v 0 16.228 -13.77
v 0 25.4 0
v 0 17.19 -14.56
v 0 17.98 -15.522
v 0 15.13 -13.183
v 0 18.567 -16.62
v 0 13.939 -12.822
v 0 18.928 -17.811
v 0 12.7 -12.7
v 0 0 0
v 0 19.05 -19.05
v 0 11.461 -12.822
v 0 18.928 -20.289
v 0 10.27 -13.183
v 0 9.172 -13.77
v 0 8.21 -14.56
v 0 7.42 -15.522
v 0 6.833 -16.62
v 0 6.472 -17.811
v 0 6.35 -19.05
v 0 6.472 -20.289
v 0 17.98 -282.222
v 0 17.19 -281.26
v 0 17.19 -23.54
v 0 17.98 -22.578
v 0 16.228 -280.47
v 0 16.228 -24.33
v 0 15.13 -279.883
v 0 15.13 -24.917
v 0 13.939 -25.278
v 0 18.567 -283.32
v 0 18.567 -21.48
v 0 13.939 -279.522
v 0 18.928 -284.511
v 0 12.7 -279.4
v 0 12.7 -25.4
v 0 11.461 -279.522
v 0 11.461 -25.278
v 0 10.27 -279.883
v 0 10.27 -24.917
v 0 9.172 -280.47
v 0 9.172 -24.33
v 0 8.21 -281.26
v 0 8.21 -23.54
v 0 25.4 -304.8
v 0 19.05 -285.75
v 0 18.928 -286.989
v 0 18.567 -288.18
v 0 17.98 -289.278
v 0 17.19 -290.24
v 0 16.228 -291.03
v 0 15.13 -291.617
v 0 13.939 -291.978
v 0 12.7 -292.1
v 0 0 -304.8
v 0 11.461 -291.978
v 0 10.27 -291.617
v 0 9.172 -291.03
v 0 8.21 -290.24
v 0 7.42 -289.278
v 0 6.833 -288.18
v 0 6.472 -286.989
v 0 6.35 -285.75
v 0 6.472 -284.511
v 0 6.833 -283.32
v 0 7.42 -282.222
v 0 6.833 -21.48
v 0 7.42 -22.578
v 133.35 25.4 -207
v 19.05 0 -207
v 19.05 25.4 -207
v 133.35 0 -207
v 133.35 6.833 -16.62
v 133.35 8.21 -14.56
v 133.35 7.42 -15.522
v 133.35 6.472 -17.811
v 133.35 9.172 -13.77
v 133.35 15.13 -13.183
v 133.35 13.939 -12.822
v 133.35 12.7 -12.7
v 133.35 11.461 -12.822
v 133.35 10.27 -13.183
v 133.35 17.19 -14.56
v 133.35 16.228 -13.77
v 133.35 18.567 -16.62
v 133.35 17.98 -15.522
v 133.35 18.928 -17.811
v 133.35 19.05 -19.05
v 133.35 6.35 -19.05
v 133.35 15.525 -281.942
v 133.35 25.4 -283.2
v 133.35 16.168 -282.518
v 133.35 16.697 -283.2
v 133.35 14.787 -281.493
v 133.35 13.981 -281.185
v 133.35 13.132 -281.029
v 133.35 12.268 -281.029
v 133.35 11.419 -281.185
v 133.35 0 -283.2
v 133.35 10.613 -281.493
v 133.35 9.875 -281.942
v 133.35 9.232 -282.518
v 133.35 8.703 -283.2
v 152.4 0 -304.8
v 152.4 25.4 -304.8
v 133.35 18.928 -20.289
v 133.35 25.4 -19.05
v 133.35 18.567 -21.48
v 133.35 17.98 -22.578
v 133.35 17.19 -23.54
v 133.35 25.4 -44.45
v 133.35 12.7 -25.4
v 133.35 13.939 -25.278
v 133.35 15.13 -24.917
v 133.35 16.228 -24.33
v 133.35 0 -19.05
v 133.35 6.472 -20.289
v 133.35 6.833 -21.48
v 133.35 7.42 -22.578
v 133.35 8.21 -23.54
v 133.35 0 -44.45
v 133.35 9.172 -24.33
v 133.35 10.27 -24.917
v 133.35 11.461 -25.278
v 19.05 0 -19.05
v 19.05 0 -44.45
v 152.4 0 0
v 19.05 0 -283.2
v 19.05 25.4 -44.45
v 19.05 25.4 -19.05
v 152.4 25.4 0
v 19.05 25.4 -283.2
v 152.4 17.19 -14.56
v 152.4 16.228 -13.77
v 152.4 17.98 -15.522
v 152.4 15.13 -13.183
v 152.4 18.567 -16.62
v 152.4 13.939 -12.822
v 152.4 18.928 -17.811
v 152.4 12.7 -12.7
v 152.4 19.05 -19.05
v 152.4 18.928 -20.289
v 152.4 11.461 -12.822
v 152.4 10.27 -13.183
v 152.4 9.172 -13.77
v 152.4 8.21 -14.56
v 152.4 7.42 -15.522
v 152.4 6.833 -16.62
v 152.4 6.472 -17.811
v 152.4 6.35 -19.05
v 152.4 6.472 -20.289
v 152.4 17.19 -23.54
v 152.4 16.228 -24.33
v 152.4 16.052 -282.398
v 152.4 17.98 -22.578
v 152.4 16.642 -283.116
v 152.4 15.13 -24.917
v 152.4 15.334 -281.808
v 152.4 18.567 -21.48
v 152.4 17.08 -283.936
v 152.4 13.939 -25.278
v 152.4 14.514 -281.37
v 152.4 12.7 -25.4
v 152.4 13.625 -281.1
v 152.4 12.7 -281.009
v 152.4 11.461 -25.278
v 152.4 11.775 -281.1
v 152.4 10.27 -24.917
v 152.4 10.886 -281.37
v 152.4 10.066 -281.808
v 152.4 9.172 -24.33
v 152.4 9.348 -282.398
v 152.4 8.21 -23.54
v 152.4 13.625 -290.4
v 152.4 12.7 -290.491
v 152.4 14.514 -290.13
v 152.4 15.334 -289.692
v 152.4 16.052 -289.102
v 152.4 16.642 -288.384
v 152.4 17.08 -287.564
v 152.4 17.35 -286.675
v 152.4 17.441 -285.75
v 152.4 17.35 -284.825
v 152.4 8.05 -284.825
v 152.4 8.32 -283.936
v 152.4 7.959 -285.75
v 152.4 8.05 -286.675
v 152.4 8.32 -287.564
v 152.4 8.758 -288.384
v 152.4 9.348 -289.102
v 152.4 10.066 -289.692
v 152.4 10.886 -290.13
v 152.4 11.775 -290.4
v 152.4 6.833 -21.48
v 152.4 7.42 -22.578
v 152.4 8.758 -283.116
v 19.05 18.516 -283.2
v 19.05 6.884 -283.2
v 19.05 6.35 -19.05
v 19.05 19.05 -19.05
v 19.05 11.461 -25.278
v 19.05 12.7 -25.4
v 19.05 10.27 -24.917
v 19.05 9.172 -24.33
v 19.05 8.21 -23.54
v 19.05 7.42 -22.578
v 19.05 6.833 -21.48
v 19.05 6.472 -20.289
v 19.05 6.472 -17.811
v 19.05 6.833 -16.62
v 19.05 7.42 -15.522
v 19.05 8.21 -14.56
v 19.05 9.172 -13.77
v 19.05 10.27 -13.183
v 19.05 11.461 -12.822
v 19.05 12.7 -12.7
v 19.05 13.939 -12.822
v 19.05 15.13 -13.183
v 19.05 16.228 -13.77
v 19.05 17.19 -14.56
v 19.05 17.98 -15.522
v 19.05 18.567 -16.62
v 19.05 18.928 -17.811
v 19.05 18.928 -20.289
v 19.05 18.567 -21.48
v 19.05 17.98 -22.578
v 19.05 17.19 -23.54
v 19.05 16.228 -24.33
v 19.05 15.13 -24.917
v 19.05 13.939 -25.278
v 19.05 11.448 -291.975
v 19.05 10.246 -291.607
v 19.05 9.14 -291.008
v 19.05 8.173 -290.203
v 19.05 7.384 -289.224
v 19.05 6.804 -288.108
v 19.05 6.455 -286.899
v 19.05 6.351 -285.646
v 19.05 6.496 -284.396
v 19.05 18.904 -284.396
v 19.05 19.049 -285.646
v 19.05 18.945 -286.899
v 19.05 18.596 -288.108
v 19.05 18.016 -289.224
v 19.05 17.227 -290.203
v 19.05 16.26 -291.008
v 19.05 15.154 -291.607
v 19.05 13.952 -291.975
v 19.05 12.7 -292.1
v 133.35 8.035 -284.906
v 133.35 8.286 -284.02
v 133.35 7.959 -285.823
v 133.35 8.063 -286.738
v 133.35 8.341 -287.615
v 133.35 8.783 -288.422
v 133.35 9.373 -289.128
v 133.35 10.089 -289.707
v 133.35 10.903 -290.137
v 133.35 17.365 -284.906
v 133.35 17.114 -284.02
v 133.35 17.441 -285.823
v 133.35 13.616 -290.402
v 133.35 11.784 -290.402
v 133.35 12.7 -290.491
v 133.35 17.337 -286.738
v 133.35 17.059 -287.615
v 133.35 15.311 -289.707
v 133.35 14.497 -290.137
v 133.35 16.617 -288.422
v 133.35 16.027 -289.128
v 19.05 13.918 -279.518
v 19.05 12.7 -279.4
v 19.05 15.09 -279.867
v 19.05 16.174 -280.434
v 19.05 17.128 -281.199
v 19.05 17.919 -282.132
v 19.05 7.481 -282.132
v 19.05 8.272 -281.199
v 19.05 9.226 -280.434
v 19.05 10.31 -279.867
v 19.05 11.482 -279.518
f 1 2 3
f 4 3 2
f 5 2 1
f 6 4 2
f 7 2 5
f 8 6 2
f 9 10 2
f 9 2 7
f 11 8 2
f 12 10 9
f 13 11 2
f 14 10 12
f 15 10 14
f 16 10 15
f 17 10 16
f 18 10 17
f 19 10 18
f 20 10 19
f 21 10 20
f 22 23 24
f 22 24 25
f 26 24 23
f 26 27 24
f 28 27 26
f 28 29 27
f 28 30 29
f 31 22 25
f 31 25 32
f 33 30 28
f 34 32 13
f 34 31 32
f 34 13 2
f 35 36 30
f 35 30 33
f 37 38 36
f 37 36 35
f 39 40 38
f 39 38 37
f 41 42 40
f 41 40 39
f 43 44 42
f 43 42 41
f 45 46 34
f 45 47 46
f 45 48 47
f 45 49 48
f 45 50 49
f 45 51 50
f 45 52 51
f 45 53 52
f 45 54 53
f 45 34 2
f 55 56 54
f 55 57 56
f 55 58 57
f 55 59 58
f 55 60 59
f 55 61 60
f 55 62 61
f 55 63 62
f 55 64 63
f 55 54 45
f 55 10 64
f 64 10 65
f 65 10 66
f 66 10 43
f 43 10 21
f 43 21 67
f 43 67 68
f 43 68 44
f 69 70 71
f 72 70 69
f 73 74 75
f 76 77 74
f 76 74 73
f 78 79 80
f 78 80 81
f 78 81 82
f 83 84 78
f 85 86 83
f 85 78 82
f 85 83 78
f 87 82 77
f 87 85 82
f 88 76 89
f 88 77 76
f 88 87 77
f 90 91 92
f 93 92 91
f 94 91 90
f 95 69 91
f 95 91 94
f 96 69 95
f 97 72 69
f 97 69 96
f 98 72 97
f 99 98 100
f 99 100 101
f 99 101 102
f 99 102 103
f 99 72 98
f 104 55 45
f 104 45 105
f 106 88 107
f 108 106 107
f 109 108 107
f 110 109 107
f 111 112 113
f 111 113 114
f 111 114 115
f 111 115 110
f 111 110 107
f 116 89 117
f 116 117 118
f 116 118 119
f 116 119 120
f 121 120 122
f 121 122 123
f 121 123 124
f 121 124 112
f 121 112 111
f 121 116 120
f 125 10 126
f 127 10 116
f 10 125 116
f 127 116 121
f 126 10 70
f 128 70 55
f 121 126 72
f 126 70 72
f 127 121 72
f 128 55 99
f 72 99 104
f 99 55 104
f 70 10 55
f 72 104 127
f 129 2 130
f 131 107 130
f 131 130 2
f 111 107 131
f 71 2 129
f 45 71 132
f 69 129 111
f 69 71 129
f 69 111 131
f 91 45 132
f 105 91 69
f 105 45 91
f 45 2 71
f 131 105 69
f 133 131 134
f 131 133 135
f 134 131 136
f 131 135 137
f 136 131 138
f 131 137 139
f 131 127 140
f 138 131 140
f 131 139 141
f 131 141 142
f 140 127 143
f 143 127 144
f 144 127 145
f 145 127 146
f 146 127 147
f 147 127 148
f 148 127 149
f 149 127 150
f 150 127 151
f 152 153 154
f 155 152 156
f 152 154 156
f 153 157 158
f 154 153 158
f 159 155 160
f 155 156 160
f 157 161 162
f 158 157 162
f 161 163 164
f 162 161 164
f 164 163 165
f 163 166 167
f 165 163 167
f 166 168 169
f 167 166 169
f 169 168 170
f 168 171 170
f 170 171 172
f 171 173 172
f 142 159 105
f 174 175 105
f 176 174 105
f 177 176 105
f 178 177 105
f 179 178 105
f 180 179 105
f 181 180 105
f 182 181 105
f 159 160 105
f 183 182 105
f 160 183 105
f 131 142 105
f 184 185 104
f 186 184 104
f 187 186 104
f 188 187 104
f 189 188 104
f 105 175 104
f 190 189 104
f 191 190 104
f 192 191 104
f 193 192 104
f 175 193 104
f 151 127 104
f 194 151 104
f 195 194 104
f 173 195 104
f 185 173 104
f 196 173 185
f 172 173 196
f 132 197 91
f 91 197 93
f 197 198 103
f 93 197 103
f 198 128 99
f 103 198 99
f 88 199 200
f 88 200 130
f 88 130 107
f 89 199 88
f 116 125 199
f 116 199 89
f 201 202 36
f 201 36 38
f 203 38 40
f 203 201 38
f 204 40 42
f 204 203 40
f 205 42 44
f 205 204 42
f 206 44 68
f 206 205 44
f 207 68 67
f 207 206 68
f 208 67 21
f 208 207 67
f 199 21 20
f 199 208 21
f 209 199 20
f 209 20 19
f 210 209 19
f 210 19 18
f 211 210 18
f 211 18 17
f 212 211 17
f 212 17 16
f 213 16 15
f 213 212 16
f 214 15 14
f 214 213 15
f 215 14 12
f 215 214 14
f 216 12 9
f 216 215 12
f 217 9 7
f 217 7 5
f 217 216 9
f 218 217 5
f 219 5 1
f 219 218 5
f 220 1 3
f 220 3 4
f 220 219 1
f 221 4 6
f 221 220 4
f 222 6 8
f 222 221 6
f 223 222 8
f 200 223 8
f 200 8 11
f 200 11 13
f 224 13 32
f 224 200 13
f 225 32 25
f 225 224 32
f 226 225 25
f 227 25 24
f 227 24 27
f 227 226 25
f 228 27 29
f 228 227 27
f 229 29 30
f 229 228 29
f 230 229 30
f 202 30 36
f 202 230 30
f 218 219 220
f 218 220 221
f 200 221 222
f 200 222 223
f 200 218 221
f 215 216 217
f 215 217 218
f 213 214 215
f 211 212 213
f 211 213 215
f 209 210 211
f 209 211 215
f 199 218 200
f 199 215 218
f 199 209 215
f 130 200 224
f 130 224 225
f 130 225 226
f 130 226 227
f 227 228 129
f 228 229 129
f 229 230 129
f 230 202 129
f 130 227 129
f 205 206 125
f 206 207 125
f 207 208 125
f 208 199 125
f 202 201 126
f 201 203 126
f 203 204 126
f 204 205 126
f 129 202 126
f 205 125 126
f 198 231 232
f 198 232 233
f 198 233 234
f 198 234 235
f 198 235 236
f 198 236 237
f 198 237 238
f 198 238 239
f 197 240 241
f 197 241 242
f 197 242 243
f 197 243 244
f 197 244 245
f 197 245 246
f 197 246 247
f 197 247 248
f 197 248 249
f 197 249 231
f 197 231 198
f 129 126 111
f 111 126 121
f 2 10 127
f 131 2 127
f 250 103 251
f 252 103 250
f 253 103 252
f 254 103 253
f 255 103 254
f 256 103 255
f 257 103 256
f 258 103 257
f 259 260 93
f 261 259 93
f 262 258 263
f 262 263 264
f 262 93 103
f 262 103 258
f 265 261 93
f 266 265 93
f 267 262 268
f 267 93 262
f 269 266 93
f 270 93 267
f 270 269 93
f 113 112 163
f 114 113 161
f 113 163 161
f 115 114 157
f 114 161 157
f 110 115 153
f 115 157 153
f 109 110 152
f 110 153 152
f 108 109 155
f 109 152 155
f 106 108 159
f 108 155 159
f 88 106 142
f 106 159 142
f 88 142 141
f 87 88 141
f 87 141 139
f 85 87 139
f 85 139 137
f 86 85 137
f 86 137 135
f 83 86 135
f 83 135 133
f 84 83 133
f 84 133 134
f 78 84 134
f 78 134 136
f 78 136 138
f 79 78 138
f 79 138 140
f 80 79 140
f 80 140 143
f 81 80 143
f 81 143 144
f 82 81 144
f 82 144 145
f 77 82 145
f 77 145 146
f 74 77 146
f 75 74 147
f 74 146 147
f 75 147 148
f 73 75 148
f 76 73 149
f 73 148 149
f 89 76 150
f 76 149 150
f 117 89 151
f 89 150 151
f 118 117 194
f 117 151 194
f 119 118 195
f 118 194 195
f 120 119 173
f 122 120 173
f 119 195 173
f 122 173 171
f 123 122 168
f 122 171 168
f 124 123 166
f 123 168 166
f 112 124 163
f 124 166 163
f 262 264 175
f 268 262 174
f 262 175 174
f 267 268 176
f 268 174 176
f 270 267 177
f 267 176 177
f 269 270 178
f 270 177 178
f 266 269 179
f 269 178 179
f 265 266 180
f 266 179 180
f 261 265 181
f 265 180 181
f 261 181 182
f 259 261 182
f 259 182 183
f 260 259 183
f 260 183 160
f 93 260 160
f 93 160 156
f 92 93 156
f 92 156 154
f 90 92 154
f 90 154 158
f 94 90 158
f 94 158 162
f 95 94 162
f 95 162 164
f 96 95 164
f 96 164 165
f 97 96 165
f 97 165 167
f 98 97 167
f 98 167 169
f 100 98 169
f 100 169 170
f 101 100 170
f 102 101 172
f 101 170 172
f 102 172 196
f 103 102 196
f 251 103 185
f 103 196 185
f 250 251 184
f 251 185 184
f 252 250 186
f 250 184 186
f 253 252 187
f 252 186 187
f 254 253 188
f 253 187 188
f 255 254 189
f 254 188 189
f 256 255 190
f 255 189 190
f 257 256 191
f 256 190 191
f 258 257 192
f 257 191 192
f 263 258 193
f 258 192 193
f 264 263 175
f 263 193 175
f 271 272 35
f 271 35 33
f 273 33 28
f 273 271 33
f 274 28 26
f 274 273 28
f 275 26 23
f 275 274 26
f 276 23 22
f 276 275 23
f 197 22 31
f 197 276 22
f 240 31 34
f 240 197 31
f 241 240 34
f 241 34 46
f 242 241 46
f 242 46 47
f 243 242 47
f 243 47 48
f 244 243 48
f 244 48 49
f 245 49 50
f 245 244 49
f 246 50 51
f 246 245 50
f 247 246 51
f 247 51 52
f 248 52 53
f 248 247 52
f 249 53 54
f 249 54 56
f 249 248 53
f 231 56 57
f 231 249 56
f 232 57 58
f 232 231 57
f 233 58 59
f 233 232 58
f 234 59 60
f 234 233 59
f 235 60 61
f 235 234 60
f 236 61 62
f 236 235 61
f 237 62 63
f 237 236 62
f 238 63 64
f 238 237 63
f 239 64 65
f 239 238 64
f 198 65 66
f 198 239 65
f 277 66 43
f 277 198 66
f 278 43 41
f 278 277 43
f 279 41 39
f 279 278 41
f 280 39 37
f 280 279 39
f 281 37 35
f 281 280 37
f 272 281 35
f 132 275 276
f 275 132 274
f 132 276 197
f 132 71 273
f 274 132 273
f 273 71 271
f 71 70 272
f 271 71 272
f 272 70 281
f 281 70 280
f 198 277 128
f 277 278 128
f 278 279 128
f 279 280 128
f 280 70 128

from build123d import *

# Parameters (mm, degrees)
SKETCH1_W           = 152.4
SKETCH1_H           = 304.8
BOSS_EXTRUDE1_DEPTH = 25.4
SKETCH2_R           = 6.35
CUT_EXTRUDE1_DEPTH  = 19.05
SKETCH3_R           = 4.741125957
CUT_EXTRUDE2_DEPTH  = 19.05
CUT_EXTRUDE3_START  = -19.05
SKETCH8_R           = 6.35
CUT_EXTRUDE3_DEPTH  = 19.05
SKETCH9_W           = 114.3
SKETCH9_H           = 25.4
SKETCH9_H_2         = 76.2
CUT_EXTRUDE5_DEPTH  = 27.94


with BuildPart() as part:
    # Sketch1 → Boss-Extrude1 (new body)
    with BuildSketch(Plane(origin=(0, 0, 0), x_dir=(1, 0, 0), z_dir=(0, 1, 0))):
        with Locations((76.2, 152.4)):
            Rectangle(SKETCH1_W, SKETCH1_H)
    extrude(amount=BOSS_EXTRUDE1_DEPTH)

    # Sketch2 → Cut-Extrude1 (cut)
    with BuildSketch(Plane(origin=(152.4, 0, 0), x_dir=(0, 0, -1), z_dir=(1, 0, 0))):
        with Locations((19.05, 12.7)):
            Circle(SKETCH2_R)
    extrude(amount=-CUT_EXTRUDE1_DEPTH, mode=Mode.SUBTRACT)

    # Sketch3 → Cut-Extrude2 (cut)
    with BuildSketch(Plane(origin=(152.4, 0, 0), x_dir=(0, 0, -1), z_dir=(1, 0, 0))):
        with Locations((285.75, 12.7)):
            Circle(SKETCH3_R)
    extrude(amount=-CUT_EXTRUDE2_DEPTH, mode=Mode.SUBTRACT)

    # Sketch8 → Cut-Extrude3 (cut)
    with BuildSketch(Plane.ZY.offset(CUT_EXTRUDE3_START)):
        with Locations((-285.75, 12.7)):
            Circle(SKETCH8_R)
        with Locations(Location((-19.05, 12.7, 0), (0, 0, 180))):
            Circle(SKETCH8_R)
    extrude(amount=CUT_EXTRUDE3_DEPTH, mode=Mode.SUBTRACT)

    # Sketch9 → Cut-Extrude5 (cut)
    with BuildSketch(Plane(origin=(0, 0, 0), x_dir=(1, 0, 0), z_dir=(0, 1, 0))):
        with Locations((76.2, 31.75)):
            Rectangle(SKETCH9_W, SKETCH9_H)
        with Locations((76.2, 245.100072294)):
            Rectangle(SKETCH9_W, SKETCH9_H_2)
    extrude(amount=CUT_EXTRUDE5_DEPTH, mode=Mode.SUBTRACT)


solid = part.part
